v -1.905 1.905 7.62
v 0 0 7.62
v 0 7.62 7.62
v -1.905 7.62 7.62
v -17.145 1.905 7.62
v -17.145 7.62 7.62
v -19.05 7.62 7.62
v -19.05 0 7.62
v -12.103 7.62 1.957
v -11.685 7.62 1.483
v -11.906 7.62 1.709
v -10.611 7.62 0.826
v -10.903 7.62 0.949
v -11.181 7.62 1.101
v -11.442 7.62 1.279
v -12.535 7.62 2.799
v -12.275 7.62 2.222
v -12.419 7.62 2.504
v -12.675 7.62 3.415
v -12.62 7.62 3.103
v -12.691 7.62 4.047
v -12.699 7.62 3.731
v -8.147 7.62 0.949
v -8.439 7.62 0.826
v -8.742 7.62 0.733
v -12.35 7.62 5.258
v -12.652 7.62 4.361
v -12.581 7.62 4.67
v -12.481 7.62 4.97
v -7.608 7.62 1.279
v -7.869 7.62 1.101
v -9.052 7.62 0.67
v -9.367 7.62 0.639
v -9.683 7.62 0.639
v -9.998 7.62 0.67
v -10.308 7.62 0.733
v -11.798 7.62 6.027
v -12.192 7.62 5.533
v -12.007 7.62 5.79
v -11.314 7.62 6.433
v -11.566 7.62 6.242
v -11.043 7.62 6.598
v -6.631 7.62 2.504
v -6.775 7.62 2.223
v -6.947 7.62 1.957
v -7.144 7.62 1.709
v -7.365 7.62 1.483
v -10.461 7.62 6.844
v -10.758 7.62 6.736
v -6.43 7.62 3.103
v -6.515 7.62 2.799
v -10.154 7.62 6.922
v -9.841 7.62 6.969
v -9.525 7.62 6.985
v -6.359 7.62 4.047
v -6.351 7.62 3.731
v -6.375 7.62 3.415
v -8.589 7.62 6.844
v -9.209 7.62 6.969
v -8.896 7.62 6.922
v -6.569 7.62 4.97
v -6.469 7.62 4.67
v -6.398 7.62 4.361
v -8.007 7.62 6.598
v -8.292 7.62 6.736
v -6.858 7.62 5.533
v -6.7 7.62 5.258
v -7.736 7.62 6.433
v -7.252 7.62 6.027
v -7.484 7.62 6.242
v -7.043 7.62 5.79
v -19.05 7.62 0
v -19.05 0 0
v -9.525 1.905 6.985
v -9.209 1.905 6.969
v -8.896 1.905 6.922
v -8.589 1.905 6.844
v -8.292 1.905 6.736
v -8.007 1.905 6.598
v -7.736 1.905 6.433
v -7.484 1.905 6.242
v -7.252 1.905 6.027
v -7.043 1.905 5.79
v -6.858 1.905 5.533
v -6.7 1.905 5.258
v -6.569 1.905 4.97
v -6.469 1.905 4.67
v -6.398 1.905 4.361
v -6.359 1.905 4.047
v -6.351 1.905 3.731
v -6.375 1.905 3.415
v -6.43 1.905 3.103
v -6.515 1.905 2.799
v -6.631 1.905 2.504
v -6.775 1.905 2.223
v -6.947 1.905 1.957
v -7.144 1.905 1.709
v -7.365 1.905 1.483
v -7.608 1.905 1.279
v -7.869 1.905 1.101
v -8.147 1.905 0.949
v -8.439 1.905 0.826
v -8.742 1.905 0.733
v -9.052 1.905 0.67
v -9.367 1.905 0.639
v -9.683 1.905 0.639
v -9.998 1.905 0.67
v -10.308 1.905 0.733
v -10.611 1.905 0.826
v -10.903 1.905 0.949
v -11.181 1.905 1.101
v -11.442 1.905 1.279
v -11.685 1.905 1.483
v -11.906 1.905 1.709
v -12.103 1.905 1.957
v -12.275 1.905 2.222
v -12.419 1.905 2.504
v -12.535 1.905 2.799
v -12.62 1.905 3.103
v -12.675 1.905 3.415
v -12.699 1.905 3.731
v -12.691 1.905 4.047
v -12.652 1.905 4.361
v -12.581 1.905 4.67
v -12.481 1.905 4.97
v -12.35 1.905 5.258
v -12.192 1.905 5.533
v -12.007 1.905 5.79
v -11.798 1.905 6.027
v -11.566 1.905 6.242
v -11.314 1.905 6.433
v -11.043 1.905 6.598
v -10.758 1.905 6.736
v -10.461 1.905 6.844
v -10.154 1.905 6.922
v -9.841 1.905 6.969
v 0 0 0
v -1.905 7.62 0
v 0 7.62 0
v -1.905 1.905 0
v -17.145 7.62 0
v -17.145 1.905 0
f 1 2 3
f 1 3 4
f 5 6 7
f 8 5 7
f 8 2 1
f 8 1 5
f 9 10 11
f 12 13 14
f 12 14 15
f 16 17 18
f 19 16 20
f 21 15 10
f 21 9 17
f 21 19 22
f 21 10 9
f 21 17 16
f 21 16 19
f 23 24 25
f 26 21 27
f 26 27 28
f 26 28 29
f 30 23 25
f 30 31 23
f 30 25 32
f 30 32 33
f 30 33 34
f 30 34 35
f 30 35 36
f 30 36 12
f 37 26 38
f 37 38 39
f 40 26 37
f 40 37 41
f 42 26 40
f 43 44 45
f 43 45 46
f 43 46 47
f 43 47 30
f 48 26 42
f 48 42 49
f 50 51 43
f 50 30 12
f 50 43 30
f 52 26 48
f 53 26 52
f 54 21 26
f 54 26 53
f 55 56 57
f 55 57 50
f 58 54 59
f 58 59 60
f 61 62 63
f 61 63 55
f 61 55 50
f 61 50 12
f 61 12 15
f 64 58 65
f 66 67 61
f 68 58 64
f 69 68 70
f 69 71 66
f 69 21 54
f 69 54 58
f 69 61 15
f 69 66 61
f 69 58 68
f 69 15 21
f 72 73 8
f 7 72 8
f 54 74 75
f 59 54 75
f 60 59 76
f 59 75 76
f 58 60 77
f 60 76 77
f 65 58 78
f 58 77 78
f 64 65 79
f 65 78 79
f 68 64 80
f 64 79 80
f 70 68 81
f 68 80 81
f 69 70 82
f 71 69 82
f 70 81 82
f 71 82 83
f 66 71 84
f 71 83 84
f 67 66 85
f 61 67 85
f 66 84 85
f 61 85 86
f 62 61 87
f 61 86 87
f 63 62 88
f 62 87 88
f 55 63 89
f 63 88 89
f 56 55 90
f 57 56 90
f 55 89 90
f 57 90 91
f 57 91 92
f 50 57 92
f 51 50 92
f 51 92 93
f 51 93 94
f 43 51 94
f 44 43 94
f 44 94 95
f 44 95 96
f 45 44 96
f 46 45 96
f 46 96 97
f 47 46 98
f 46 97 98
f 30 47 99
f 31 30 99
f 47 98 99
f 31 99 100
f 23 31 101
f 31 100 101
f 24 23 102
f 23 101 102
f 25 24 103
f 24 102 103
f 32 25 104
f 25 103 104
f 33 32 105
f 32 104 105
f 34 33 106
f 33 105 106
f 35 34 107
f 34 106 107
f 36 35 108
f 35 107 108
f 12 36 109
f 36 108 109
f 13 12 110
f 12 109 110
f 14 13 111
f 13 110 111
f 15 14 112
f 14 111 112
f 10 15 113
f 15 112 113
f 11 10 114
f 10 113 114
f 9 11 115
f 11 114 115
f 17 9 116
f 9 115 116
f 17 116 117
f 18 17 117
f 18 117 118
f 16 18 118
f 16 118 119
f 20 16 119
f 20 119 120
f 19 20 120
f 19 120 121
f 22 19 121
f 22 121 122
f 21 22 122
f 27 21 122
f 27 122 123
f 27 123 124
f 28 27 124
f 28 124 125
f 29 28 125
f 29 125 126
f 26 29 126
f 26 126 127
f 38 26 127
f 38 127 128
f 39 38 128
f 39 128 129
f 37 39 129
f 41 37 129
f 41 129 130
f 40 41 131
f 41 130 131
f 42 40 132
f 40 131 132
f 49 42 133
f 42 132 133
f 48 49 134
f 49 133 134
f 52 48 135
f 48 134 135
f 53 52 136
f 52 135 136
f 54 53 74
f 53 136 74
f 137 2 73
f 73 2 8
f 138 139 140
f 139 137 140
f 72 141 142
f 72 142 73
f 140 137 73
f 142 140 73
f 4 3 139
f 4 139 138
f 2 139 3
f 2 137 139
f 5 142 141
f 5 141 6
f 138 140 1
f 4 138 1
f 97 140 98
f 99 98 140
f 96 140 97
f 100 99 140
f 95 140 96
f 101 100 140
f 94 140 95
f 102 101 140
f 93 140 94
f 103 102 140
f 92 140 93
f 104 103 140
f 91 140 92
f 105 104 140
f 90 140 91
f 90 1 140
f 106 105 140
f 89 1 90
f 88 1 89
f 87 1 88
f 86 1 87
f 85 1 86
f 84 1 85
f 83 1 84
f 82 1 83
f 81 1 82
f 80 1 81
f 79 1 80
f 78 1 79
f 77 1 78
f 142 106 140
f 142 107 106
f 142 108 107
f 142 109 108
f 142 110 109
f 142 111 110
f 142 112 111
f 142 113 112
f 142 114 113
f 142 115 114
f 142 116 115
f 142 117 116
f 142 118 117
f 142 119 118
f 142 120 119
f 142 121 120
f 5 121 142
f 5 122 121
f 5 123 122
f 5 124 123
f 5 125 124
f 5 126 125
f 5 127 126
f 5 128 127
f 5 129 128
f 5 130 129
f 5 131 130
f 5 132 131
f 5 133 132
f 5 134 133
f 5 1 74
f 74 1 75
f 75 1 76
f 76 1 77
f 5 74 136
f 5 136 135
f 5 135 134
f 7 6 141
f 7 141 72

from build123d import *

# Parameters (mm, degrees)
SKETCH1_W           = 19.05
SKETCH1_H           = 7.62
BOSS_EXTRUDE1_DEPTH = 1.905
SKETCH2_R           = 3.175
BOSS_EXTRUDE2_DEPTH = 5.715
SKETCH3_W           = 1.905
SKETCH3_H           = 7.62
BOSS_EXTRUDE3_DEPTH = 5.715


with BuildPart() as part:
    # Sketch1 → Boss-Extrude1 (new body)
    with BuildSketch(Plane(origin=(0, 0, 0), x_dir=(-1, 0, 0), z_dir=(0, 1, 0))):
        with Locations((9.525, 3.81)):
            Rectangle(SKETCH1_W, SKETCH1_H)
    extrude(amount=BOSS_EXTRUDE1_DEPTH)

    # Sketch2 → Boss-Extrude2 (add)
    with BuildSketch(Plane(origin=(0, 1.905, 0), x_dir=(-1, 0, 0), z_dir=(0, 1, 0))):
        with Locations(Location((9.525, 3.81, 0), (0, 0, 90))):
            Circle(SKETCH2_R)
    extrude(amount=BOSS_EXTRUDE2_DEPTH)

    # Sketch3 → Boss-Extrude3 (add)
    with BuildSketch(Plane(origin=(0, 1.905, 0), x_dir=(-1, 0, 0), z_dir=(0, 1, 0))):
        with Locations((0.9525, 3.81)):
            Rectangle(SKETCH3_W, SKETCH3_H)
        with Locations((18.0975, 3.81)):
            Rectangle(SKETCH3_W, SKETCH3_H)
    extrude(amount=BOSS_EXTRUDE3_DEPTH)


solid = part.part
